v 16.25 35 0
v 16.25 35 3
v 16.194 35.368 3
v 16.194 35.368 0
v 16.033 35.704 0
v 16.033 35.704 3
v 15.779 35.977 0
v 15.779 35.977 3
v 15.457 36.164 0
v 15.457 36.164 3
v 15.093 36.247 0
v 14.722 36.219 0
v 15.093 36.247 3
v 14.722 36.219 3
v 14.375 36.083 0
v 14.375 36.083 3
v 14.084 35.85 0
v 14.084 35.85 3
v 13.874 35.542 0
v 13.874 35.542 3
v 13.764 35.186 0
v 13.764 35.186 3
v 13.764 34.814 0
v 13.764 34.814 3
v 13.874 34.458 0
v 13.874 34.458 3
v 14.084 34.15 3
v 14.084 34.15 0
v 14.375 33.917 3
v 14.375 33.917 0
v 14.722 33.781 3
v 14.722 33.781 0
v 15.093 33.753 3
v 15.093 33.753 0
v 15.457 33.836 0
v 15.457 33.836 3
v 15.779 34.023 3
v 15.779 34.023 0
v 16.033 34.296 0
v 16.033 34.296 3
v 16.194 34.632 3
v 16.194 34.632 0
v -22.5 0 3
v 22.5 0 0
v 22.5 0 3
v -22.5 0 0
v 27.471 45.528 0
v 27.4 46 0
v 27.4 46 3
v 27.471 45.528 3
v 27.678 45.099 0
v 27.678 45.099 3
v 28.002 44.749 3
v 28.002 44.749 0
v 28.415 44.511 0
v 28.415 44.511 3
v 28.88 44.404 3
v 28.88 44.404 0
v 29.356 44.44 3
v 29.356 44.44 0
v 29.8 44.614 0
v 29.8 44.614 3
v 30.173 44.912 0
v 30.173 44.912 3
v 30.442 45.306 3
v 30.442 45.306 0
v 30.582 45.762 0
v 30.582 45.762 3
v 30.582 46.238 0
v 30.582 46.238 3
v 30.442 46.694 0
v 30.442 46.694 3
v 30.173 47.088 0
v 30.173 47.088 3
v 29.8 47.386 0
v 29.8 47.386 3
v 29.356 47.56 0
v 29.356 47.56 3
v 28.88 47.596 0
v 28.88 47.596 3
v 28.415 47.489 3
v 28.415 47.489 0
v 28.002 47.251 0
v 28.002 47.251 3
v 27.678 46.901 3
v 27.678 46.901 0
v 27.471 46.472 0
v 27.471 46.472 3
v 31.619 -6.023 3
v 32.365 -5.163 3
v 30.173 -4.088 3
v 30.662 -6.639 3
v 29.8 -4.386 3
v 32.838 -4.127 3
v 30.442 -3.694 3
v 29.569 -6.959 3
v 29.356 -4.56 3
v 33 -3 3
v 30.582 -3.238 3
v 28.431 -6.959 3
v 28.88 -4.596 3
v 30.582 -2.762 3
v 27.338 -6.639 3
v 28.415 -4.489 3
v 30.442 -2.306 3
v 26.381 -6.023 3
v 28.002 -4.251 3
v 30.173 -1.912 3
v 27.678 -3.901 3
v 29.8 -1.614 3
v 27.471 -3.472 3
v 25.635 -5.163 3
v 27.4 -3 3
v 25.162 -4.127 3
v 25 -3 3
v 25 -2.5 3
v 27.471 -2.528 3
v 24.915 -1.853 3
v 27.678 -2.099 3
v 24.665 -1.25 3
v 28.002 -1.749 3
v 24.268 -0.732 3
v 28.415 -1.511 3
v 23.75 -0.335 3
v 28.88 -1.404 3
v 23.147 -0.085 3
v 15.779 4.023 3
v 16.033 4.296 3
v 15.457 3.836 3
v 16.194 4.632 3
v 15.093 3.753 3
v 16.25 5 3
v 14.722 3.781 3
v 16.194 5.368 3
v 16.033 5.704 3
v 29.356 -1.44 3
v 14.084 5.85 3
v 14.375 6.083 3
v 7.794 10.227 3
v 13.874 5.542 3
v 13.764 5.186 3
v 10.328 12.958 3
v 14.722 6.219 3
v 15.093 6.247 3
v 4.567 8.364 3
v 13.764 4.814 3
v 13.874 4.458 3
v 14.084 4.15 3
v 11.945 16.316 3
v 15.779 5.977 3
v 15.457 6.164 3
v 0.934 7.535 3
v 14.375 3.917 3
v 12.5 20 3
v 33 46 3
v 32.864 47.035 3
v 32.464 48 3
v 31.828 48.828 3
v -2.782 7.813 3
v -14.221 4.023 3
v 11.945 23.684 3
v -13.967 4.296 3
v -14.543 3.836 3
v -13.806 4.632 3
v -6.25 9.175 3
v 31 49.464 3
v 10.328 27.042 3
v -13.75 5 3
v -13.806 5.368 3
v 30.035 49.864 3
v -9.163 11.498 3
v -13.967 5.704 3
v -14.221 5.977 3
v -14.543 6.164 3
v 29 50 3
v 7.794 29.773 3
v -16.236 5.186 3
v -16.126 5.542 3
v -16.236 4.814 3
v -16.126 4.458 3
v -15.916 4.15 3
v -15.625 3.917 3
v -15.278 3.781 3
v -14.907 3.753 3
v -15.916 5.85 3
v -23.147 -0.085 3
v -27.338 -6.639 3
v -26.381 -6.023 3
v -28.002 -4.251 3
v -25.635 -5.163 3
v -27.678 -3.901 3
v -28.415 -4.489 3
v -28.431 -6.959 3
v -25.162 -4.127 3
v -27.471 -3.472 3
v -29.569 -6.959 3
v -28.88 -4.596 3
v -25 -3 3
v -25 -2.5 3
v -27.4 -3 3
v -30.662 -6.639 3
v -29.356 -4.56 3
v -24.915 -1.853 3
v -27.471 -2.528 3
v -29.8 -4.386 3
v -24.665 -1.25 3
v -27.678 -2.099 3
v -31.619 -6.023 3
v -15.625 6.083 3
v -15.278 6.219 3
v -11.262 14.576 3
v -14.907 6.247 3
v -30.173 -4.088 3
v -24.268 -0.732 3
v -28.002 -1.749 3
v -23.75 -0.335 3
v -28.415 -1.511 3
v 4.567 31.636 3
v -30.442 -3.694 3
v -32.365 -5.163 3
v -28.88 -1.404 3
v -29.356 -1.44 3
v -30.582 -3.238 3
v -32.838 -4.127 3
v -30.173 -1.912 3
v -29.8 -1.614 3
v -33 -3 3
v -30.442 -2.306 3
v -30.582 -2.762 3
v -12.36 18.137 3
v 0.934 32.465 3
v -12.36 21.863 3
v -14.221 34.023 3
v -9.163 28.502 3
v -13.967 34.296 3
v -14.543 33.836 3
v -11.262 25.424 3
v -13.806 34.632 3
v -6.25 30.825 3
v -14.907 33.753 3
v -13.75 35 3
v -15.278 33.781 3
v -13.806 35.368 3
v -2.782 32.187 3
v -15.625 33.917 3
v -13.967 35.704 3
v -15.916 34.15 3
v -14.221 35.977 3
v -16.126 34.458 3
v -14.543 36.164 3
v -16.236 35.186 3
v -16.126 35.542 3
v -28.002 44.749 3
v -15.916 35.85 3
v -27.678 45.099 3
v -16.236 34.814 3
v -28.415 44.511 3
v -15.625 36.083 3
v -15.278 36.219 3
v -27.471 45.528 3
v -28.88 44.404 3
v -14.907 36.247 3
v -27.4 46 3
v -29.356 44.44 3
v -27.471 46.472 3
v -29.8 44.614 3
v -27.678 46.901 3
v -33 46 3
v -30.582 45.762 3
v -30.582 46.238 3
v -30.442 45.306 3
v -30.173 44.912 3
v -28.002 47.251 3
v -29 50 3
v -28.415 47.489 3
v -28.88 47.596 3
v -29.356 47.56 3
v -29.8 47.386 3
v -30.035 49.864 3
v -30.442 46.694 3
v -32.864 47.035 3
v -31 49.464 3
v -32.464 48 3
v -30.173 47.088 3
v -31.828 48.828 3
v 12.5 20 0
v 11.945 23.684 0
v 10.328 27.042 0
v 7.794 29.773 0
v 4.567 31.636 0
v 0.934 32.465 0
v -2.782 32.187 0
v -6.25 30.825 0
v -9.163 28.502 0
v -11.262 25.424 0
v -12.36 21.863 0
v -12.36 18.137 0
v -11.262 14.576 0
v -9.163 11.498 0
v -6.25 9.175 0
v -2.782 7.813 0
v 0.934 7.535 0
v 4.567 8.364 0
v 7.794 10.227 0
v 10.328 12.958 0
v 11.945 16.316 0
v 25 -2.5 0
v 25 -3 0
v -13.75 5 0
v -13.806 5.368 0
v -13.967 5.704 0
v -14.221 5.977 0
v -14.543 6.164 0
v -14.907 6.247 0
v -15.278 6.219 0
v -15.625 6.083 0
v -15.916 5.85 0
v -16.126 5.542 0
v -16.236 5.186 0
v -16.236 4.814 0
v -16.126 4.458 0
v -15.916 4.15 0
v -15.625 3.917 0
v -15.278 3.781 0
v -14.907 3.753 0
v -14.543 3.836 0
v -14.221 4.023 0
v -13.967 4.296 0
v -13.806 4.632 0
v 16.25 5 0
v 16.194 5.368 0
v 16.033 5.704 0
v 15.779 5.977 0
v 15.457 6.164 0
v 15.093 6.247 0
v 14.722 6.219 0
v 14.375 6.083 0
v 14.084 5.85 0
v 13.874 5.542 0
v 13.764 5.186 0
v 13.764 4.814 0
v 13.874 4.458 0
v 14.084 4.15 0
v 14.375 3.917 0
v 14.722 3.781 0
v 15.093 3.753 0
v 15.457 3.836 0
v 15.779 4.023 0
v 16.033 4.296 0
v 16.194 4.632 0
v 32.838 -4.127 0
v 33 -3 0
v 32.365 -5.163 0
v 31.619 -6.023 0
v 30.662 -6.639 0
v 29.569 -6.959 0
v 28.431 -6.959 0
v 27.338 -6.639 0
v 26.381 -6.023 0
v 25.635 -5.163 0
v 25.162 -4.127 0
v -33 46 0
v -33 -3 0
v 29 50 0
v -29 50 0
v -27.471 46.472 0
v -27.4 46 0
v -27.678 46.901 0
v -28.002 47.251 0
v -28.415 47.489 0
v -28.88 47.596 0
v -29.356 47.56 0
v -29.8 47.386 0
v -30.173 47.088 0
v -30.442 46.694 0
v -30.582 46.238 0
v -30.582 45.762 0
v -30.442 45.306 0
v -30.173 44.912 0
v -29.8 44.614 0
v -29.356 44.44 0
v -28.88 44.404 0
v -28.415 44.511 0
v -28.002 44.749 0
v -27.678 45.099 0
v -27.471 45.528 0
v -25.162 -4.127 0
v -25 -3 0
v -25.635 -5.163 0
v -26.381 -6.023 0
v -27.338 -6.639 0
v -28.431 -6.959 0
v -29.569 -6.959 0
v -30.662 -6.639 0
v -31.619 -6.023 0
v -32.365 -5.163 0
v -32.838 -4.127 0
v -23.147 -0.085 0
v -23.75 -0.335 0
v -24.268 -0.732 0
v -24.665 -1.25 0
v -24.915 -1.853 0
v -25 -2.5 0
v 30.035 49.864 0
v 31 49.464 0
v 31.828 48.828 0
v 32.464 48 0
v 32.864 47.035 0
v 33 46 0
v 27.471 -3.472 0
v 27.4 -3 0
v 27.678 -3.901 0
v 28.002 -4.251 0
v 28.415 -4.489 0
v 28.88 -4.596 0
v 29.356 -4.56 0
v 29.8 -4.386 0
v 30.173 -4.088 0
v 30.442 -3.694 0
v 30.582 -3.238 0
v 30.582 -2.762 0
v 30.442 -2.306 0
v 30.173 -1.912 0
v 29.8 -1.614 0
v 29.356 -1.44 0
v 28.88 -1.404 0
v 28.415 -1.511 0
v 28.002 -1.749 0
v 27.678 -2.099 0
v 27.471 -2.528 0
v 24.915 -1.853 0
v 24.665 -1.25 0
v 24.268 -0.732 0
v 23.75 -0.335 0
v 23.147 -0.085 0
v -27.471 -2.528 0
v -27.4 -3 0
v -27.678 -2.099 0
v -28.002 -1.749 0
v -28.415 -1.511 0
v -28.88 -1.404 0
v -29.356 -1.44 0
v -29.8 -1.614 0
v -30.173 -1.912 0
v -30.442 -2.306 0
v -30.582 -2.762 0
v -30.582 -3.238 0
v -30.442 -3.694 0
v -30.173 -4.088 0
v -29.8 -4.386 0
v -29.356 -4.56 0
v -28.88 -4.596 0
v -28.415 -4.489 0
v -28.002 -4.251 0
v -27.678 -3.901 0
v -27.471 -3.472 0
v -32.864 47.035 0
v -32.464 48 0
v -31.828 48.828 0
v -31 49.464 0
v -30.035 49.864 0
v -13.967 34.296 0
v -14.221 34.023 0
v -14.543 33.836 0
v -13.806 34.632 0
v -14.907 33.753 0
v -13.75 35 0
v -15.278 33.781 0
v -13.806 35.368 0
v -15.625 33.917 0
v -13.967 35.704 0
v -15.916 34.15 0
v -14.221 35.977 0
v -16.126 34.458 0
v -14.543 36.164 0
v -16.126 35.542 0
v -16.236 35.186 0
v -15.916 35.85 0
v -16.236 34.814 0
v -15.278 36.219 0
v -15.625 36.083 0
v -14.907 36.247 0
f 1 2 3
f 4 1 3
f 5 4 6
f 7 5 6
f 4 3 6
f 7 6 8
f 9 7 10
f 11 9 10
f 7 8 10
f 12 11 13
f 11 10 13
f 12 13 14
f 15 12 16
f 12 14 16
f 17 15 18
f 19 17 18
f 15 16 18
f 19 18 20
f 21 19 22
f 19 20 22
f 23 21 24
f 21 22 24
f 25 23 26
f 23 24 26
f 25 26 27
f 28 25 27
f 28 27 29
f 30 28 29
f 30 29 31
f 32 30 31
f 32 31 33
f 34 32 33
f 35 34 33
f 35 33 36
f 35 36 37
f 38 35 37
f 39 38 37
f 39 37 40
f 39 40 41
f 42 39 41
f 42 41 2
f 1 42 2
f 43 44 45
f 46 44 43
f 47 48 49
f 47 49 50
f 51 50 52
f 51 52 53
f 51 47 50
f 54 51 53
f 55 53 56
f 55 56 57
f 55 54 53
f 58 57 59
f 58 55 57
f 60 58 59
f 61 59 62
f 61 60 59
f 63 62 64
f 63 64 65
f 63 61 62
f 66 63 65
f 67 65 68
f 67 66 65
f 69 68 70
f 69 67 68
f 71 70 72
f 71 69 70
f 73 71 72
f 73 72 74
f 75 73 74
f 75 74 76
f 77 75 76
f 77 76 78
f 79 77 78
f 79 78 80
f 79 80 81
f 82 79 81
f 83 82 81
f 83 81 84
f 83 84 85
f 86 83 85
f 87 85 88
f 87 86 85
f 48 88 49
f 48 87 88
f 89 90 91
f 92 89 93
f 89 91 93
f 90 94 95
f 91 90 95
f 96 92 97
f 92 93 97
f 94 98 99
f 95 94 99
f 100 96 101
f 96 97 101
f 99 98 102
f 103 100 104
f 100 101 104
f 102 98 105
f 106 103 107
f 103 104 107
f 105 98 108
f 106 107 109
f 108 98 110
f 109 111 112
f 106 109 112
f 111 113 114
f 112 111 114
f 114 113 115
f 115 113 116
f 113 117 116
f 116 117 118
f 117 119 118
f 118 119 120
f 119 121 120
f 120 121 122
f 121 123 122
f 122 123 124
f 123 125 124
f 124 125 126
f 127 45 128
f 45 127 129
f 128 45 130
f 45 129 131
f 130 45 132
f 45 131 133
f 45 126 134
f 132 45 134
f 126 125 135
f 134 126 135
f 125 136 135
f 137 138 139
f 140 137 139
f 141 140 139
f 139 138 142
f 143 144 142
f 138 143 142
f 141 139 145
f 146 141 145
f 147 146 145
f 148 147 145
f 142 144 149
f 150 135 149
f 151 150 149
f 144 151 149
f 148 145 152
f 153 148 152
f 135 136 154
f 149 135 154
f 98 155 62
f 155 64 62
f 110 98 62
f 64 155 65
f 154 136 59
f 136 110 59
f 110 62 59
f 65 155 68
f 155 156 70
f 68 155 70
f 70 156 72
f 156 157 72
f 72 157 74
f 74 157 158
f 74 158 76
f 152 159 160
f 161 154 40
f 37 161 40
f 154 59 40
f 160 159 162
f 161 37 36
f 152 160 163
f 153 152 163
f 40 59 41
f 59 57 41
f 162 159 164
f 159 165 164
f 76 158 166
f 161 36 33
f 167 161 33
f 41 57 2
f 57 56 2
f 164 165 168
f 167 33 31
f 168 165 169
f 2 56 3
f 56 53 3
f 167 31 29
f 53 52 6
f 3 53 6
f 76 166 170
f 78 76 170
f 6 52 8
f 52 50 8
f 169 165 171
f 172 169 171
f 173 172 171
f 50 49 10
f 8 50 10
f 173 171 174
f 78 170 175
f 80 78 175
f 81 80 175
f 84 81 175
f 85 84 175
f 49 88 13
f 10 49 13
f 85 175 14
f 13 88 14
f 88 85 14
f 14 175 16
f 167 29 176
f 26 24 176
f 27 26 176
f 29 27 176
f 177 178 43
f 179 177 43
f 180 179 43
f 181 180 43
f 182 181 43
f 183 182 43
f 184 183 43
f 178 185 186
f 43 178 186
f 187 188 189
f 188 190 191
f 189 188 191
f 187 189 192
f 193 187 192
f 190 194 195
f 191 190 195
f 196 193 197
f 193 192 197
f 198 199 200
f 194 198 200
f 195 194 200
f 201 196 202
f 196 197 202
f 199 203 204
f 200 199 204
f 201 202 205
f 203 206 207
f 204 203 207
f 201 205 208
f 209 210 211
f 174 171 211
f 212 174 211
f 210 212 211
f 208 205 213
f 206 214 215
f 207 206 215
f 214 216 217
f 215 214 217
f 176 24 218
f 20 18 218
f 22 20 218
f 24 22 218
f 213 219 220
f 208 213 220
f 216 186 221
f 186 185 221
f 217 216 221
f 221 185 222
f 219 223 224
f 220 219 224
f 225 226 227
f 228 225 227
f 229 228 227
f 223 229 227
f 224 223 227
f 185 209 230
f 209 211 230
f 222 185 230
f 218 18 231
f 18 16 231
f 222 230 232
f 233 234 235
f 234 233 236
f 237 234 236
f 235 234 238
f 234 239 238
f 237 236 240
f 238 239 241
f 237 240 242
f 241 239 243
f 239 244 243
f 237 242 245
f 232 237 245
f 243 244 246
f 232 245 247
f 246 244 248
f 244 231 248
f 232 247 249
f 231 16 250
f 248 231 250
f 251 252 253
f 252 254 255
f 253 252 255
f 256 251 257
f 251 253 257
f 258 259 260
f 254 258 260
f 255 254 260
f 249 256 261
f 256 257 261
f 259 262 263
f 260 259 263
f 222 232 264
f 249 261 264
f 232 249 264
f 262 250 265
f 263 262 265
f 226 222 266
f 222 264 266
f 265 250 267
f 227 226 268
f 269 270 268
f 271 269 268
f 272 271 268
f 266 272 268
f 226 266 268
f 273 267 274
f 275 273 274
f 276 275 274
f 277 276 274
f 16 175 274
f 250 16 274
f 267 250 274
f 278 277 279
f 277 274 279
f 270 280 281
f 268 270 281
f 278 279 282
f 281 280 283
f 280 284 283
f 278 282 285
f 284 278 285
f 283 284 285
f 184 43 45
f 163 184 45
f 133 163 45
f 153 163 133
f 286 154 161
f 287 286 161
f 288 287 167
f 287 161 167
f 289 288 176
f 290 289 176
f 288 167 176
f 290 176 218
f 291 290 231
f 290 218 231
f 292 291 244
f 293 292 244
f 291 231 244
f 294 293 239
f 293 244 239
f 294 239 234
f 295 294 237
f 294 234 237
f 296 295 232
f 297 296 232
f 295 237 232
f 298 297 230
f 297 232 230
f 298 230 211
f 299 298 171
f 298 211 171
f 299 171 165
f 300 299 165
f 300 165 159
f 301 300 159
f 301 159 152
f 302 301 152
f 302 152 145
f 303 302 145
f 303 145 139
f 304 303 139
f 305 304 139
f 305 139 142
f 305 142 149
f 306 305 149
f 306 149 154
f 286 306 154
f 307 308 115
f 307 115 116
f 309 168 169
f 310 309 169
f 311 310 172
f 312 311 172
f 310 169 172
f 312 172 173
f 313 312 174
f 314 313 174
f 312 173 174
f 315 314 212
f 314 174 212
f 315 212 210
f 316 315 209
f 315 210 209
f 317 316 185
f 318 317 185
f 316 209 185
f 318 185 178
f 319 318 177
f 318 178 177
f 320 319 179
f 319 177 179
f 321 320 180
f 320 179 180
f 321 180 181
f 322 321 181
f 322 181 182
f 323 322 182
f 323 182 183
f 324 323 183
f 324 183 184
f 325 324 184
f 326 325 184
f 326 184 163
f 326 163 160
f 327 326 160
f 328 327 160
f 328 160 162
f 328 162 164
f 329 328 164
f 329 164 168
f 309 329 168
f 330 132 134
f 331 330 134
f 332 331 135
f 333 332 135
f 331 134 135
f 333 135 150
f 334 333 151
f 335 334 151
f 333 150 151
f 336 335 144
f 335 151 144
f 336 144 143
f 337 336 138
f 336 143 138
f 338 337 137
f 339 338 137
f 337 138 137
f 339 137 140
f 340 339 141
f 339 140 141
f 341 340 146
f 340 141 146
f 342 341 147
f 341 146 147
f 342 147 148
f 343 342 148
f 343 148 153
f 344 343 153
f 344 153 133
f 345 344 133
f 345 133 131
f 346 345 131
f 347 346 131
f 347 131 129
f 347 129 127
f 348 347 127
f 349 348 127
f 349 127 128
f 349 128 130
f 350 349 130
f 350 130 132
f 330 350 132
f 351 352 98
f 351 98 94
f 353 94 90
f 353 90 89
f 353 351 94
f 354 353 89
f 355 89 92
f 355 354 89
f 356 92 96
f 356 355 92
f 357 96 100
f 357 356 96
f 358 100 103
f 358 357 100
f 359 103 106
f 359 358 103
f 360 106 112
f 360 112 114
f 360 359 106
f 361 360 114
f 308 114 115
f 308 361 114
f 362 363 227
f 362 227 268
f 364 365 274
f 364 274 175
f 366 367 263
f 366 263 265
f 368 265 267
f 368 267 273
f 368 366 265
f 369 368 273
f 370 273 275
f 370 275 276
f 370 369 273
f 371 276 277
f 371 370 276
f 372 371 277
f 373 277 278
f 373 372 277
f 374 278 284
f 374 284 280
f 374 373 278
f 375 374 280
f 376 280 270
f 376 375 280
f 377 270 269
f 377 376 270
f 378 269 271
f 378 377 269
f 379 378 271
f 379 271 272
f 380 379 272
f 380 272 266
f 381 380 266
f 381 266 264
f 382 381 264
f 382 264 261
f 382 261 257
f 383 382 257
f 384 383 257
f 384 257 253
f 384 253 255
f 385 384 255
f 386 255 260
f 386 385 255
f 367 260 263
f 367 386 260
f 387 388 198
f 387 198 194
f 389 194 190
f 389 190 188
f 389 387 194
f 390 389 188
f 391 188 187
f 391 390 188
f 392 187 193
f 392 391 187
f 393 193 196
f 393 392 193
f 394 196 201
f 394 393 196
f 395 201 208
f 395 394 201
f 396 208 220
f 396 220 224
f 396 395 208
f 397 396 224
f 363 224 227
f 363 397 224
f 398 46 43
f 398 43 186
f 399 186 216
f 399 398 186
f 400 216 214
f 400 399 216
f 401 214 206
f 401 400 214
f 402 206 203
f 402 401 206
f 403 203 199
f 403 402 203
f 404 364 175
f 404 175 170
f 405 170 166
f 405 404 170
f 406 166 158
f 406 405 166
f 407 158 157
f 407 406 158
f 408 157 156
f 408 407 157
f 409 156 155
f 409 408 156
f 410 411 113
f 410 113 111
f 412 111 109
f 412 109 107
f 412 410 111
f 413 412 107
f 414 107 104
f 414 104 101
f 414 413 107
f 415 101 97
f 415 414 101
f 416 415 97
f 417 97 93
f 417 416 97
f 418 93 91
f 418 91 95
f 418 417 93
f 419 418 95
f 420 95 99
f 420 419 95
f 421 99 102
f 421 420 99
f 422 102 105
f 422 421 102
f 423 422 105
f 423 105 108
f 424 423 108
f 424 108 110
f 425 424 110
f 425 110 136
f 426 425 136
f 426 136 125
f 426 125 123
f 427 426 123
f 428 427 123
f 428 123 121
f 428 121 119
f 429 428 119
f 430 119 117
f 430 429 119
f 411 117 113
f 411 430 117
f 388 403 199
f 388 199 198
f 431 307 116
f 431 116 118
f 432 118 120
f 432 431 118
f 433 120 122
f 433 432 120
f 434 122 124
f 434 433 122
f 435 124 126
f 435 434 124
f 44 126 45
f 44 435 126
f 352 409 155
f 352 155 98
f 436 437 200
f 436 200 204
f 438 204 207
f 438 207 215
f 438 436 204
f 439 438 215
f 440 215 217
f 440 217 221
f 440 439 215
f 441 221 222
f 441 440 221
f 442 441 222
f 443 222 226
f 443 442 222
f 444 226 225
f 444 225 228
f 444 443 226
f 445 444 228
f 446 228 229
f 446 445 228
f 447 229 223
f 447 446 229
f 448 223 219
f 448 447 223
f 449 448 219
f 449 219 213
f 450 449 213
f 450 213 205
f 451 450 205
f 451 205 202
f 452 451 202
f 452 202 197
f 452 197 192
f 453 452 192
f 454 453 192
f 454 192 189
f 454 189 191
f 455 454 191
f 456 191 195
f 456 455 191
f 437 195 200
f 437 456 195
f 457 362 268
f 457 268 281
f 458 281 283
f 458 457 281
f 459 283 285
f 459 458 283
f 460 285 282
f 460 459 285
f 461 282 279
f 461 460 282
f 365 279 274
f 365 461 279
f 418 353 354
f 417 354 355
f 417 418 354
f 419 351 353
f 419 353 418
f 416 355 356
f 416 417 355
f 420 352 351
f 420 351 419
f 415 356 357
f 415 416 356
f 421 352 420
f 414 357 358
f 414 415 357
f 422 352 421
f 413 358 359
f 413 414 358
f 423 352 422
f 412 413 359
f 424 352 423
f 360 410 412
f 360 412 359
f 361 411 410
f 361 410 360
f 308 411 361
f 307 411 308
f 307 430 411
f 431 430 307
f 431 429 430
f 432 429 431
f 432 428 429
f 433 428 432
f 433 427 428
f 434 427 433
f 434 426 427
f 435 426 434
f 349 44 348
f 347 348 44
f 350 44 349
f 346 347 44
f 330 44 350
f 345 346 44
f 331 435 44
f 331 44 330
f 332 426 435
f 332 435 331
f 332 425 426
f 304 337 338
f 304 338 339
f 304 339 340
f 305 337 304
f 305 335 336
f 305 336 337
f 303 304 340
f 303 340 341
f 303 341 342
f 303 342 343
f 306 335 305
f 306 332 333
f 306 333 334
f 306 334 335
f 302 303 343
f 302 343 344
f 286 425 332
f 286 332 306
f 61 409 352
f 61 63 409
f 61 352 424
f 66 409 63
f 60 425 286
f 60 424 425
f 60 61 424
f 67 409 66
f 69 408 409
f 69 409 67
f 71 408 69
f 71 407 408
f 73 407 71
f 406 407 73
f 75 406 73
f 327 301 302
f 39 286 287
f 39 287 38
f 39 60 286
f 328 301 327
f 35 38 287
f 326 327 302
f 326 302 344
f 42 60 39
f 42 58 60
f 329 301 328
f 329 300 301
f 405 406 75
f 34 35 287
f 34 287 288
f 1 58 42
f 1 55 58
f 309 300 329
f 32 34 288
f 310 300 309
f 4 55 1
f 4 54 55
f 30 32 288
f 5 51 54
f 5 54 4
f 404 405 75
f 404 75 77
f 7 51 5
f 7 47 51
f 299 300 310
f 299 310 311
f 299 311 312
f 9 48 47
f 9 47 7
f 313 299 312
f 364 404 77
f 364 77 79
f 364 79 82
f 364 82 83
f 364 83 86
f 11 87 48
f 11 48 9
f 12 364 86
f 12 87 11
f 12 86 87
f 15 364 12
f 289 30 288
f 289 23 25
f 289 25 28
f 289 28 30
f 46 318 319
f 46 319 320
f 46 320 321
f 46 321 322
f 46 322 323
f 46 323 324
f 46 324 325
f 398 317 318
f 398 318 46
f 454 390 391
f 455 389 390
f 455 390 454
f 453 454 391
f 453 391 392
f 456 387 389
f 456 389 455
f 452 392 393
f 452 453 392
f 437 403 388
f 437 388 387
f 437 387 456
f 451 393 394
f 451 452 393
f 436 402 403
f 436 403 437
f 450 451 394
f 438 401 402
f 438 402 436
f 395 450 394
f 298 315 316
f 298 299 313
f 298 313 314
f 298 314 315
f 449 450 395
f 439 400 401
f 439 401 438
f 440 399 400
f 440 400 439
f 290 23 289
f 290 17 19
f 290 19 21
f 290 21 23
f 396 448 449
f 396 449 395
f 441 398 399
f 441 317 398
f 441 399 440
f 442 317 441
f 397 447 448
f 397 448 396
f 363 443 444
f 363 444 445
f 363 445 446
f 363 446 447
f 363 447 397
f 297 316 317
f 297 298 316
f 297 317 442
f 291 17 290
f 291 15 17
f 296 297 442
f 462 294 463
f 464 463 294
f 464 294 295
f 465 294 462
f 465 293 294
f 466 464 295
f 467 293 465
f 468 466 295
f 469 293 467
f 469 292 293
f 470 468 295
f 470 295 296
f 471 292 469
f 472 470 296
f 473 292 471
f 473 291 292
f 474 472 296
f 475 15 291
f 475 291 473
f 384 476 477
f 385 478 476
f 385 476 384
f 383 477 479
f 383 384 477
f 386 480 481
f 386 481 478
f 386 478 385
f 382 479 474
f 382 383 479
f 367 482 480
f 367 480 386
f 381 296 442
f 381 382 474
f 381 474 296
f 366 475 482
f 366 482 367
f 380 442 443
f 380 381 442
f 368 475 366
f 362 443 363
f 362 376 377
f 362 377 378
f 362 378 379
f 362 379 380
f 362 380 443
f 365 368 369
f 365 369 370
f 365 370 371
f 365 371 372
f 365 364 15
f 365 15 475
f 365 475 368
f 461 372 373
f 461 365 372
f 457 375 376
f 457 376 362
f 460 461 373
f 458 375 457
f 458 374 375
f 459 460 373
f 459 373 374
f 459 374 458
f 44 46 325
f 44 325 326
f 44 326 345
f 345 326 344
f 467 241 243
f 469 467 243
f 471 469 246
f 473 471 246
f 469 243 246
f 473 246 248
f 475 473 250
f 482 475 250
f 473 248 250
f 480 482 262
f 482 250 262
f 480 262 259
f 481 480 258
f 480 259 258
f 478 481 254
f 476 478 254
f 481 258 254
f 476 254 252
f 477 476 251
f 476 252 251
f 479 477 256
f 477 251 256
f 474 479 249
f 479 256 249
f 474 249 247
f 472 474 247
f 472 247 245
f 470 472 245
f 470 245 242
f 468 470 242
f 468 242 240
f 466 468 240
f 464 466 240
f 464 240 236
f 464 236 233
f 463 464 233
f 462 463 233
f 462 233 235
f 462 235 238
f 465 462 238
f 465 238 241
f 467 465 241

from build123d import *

# Parameters (mm, degrees)
SKETCH_1_R          = 1.6
EXTRUDE_1_DEPTH     = 3
SKETCH_2_R          = 1.25
SKETCH_2_R_2        = 12.5
CUT_EXTRUDE_1_DEPTH = 60.983331018


with BuildPart() as part:
    # ｽｹｯﾁ1 → ﾎﾞｽ - 押し出し1 (new body)
    with BuildSketch(Plane.XY):
        with BuildLine():
            Line((22.5, 0), (-22.5, 0))
            ThreePointArc((-22.5, 0), (-24.267766953, -0.732233047), (-25, -2.5))
            Line((-25, -2.5), (-25, -3))
            ThreePointArc((-25, -3), (-29, -7), (-33, -3))
            Line((-33, -3), (-33, 46))
            ThreePointArc((-33, 46), (-31.828427125, 48.828427125), (-29, 50))
            Line((-29, 50), (29, 50))
            ThreePointArc((29, 50), (31.828427125, 48.828427125), (33, 46))
            Line((33, 46), (33, -3))
            ThreePointArc((33, -3), (29, -7), (25, -3))
            Line((25, -3), (25, -2.5))
            ThreePointArc((25, -2.5), (24.267766953, -0.732233047), (22.5, 0))
        make_face()
        with Locations((-29, -3)):
            Circle(SKETCH_1_R, mode=Mode.SUBTRACT)
        with Locations((-29, 46)):
            Circle(SKETCH_1_R, mode=Mode.SUBTRACT)
        with Locations(Location((29, 46, 0), (0, 0, 180))):
            Circle(SKETCH_1_R, mode=Mode.SUBTRACT)
        with Locations(Location((29, -3, 0), (0, 0, 180))):
            Circle(SKETCH_1_R, mode=Mode.SUBTRACT)
    extrude(amount=EXTRUDE_1_DEPTH)

    # ｽｹｯﾁ2 → ｶｯﾄ - 押し出し1 (cut, through all)
    with BuildSketch(Plane.XY.offset(3)):
        with Locations((-15, 35)):
            Circle(SKETCH_2_R)
        with Locations((-15, 5)):
            Circle(SKETCH_2_R)
        with Locations((15, 5)):
            Circle(SKETCH_2_R)
        with Locations((15, 35)):
            Circle(SKETCH_2_R)
        with Locations((0, 20)):
            Circle(SKETCH_2_R_2)
    extrude(amount=-CUT_EXTRUDE_1_DEPTH, mode=Mode.SUBTRACT)


solid = part.part
